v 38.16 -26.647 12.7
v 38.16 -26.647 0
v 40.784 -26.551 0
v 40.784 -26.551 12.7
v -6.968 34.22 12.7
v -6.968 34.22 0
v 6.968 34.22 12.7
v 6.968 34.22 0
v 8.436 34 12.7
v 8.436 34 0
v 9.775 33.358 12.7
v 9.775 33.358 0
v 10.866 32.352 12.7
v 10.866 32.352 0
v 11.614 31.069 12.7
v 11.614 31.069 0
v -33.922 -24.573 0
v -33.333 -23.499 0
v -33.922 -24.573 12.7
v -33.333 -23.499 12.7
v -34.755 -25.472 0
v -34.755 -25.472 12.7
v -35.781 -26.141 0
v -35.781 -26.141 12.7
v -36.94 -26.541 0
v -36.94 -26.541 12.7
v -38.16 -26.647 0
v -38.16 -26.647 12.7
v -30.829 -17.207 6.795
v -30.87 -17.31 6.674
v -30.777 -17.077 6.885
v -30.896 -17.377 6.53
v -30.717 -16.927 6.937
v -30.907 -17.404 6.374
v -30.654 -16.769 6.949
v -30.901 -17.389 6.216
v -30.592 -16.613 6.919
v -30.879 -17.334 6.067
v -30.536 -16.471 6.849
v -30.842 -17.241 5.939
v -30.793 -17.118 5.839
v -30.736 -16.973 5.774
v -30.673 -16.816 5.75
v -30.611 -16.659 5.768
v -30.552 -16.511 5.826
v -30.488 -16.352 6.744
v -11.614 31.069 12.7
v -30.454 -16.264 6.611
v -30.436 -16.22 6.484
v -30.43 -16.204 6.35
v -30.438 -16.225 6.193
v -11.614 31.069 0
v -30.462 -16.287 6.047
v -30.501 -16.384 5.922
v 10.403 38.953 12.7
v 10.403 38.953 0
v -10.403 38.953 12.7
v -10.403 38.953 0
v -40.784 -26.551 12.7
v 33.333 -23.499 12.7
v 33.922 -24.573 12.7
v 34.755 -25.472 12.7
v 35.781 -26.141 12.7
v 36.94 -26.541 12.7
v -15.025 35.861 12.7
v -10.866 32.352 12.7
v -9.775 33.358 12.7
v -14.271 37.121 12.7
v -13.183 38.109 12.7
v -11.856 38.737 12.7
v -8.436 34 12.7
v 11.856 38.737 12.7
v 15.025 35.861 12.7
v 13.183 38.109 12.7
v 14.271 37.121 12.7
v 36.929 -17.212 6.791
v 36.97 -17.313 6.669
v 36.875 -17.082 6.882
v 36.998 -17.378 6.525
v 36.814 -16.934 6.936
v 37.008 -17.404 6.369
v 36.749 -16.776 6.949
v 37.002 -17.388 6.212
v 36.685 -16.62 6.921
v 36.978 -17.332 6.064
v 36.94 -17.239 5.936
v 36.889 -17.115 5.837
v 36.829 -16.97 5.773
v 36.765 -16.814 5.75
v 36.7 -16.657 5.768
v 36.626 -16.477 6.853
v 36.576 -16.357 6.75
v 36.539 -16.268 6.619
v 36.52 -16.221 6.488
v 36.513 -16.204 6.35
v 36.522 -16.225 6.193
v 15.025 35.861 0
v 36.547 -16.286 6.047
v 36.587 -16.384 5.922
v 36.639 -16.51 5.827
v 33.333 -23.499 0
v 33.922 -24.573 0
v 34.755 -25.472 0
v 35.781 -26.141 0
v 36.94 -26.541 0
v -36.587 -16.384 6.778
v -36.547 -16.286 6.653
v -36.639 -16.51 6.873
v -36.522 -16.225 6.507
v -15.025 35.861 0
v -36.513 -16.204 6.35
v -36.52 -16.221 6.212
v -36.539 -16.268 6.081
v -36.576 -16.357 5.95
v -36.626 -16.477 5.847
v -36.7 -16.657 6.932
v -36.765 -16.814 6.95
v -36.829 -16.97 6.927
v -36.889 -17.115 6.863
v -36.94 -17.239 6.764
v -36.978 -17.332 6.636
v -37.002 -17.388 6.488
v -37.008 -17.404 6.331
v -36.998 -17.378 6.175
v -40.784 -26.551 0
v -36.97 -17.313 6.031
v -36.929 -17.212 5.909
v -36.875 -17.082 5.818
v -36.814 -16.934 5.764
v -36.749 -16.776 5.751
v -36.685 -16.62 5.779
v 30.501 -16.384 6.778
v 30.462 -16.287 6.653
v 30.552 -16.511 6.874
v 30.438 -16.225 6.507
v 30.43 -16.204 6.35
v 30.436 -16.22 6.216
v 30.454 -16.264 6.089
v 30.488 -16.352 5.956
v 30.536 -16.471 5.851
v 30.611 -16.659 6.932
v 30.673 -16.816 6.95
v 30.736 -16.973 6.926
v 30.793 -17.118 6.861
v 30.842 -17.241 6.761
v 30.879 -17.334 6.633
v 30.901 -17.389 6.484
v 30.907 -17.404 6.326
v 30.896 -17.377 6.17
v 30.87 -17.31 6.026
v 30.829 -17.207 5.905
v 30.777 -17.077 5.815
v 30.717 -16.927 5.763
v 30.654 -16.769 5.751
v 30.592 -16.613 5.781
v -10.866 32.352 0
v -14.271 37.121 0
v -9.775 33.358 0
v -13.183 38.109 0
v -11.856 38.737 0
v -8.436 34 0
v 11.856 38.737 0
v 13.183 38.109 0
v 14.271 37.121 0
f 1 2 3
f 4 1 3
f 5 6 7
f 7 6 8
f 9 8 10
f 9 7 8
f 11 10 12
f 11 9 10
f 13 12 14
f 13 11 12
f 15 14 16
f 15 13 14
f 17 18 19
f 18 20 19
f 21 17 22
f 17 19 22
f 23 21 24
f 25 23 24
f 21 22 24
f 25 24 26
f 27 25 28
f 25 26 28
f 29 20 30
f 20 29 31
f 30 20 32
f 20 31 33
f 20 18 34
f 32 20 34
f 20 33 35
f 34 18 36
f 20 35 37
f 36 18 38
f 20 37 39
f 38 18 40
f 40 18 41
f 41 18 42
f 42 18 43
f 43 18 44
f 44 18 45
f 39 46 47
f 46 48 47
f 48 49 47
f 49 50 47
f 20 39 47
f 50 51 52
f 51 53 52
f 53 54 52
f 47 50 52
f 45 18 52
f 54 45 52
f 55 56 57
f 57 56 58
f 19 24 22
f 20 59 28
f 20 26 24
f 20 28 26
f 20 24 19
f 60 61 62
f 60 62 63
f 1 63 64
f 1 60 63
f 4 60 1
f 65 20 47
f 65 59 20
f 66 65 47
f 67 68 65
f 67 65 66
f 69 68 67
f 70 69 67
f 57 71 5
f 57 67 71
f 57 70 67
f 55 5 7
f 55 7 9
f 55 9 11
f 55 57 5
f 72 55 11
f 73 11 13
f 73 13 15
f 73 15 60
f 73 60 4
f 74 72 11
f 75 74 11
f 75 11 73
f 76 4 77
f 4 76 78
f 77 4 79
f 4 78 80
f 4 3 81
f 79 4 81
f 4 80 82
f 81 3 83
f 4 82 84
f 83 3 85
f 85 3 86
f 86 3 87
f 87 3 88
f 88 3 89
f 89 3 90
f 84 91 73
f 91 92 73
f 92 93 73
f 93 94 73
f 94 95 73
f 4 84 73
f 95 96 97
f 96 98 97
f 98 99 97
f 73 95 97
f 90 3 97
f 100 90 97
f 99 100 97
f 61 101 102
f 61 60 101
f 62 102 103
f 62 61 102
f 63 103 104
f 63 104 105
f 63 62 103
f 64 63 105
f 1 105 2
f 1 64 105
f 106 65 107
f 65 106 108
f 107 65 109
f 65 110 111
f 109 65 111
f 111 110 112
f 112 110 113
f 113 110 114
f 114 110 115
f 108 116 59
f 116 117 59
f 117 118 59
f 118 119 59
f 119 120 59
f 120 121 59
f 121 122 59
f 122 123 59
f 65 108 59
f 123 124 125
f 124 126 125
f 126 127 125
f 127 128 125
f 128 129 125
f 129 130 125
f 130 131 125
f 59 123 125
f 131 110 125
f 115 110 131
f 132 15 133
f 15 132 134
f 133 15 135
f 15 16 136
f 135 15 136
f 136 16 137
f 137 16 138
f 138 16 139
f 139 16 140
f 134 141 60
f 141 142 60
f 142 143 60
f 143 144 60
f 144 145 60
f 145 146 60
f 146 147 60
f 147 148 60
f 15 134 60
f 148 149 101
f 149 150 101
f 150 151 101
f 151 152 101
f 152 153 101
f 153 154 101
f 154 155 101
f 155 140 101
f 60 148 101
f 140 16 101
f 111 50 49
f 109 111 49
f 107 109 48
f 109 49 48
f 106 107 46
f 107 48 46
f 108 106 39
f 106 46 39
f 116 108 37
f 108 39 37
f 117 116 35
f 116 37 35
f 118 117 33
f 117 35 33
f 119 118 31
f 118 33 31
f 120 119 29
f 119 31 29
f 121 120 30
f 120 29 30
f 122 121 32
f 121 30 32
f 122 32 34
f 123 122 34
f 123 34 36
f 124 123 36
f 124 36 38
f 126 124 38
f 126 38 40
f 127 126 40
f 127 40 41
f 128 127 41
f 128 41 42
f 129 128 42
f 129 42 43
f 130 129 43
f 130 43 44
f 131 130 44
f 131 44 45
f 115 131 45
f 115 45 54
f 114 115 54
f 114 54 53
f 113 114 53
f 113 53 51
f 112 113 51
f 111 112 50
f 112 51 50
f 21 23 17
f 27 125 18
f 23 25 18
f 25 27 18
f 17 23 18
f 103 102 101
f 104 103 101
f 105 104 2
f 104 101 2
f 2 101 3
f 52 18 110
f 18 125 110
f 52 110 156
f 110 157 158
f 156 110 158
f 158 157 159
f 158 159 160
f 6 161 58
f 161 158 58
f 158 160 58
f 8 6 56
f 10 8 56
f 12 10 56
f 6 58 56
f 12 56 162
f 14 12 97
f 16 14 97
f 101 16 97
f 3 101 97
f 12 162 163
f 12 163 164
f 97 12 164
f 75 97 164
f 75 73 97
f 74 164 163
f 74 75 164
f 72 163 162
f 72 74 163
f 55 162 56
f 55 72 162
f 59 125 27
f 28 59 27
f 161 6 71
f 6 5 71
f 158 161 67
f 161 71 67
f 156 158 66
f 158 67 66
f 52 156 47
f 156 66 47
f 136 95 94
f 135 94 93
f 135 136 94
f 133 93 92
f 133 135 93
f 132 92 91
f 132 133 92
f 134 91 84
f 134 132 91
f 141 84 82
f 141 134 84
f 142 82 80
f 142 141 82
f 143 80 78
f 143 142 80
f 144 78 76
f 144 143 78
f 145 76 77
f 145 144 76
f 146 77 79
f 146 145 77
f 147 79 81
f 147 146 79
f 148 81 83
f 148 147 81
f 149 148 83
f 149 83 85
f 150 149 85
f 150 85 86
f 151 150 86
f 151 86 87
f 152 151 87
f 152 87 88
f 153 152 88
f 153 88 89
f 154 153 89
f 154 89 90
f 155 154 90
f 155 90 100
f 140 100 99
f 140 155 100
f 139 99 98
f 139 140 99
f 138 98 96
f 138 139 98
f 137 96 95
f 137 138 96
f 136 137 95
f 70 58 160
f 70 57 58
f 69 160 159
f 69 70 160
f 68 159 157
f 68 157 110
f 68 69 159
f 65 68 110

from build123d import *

# Parameters (mm, degrees)
F1_DEPTH      = 12.7
F2_R          = 0.6
F3_DEPTH      = 85.2
F3_DEPTH_BACK = 66
F4_R          = 5


with BuildPart() as f1:
    # F0 (on Top) → F1 (new body)
    with BuildSketch(Plane.XY):
        Polygon((-10.35969, 34.220118), (0, 34.220118), (0, 38.953215), (-13.748372, 38.953215), (-40.783513, -26.551465), (-34.636915, -26.774898), align=None)
        Polygon((0, 38.953215), (0, 34.220118), (10.35969, 34.220118), (34.636915, -26.774898), (40.783513, -26.551465), (13.748372, 38.953215), align=None)
    extrude(amount=F1_DEPTH)

    # F2 (on Right) → F3 (cut, two sides)
    with BuildSketch(Plane.YZ) as f3_sk:
        with Locations((-16.804494, 6.35)):
            Circle(F2_R)
    extrude(amount=F3_DEPTH, mode=Mode.SUBTRACT)
    extrude(f3_sk.sketch, amount=-F3_DEPTH_BACK, mode=Mode.SUBTRACT)

    # F4
    f4_edges = [f1.edges().sort_by_distance(p)[0] for p in [
        (13.748372, 38.953215, 6.35),
        (-13.748372, 38.953215, 6.35),
        (-34.636915, -26.774898, 6.35),
        (34.636915, -26.774898, 6.35),
        (-10.35969, 34.220118, 6.35),
        (10.35969, 34.220118, 6.35),
    ]]
    fillet(f4_edges, radius=F4_R)


solid = f1.part
